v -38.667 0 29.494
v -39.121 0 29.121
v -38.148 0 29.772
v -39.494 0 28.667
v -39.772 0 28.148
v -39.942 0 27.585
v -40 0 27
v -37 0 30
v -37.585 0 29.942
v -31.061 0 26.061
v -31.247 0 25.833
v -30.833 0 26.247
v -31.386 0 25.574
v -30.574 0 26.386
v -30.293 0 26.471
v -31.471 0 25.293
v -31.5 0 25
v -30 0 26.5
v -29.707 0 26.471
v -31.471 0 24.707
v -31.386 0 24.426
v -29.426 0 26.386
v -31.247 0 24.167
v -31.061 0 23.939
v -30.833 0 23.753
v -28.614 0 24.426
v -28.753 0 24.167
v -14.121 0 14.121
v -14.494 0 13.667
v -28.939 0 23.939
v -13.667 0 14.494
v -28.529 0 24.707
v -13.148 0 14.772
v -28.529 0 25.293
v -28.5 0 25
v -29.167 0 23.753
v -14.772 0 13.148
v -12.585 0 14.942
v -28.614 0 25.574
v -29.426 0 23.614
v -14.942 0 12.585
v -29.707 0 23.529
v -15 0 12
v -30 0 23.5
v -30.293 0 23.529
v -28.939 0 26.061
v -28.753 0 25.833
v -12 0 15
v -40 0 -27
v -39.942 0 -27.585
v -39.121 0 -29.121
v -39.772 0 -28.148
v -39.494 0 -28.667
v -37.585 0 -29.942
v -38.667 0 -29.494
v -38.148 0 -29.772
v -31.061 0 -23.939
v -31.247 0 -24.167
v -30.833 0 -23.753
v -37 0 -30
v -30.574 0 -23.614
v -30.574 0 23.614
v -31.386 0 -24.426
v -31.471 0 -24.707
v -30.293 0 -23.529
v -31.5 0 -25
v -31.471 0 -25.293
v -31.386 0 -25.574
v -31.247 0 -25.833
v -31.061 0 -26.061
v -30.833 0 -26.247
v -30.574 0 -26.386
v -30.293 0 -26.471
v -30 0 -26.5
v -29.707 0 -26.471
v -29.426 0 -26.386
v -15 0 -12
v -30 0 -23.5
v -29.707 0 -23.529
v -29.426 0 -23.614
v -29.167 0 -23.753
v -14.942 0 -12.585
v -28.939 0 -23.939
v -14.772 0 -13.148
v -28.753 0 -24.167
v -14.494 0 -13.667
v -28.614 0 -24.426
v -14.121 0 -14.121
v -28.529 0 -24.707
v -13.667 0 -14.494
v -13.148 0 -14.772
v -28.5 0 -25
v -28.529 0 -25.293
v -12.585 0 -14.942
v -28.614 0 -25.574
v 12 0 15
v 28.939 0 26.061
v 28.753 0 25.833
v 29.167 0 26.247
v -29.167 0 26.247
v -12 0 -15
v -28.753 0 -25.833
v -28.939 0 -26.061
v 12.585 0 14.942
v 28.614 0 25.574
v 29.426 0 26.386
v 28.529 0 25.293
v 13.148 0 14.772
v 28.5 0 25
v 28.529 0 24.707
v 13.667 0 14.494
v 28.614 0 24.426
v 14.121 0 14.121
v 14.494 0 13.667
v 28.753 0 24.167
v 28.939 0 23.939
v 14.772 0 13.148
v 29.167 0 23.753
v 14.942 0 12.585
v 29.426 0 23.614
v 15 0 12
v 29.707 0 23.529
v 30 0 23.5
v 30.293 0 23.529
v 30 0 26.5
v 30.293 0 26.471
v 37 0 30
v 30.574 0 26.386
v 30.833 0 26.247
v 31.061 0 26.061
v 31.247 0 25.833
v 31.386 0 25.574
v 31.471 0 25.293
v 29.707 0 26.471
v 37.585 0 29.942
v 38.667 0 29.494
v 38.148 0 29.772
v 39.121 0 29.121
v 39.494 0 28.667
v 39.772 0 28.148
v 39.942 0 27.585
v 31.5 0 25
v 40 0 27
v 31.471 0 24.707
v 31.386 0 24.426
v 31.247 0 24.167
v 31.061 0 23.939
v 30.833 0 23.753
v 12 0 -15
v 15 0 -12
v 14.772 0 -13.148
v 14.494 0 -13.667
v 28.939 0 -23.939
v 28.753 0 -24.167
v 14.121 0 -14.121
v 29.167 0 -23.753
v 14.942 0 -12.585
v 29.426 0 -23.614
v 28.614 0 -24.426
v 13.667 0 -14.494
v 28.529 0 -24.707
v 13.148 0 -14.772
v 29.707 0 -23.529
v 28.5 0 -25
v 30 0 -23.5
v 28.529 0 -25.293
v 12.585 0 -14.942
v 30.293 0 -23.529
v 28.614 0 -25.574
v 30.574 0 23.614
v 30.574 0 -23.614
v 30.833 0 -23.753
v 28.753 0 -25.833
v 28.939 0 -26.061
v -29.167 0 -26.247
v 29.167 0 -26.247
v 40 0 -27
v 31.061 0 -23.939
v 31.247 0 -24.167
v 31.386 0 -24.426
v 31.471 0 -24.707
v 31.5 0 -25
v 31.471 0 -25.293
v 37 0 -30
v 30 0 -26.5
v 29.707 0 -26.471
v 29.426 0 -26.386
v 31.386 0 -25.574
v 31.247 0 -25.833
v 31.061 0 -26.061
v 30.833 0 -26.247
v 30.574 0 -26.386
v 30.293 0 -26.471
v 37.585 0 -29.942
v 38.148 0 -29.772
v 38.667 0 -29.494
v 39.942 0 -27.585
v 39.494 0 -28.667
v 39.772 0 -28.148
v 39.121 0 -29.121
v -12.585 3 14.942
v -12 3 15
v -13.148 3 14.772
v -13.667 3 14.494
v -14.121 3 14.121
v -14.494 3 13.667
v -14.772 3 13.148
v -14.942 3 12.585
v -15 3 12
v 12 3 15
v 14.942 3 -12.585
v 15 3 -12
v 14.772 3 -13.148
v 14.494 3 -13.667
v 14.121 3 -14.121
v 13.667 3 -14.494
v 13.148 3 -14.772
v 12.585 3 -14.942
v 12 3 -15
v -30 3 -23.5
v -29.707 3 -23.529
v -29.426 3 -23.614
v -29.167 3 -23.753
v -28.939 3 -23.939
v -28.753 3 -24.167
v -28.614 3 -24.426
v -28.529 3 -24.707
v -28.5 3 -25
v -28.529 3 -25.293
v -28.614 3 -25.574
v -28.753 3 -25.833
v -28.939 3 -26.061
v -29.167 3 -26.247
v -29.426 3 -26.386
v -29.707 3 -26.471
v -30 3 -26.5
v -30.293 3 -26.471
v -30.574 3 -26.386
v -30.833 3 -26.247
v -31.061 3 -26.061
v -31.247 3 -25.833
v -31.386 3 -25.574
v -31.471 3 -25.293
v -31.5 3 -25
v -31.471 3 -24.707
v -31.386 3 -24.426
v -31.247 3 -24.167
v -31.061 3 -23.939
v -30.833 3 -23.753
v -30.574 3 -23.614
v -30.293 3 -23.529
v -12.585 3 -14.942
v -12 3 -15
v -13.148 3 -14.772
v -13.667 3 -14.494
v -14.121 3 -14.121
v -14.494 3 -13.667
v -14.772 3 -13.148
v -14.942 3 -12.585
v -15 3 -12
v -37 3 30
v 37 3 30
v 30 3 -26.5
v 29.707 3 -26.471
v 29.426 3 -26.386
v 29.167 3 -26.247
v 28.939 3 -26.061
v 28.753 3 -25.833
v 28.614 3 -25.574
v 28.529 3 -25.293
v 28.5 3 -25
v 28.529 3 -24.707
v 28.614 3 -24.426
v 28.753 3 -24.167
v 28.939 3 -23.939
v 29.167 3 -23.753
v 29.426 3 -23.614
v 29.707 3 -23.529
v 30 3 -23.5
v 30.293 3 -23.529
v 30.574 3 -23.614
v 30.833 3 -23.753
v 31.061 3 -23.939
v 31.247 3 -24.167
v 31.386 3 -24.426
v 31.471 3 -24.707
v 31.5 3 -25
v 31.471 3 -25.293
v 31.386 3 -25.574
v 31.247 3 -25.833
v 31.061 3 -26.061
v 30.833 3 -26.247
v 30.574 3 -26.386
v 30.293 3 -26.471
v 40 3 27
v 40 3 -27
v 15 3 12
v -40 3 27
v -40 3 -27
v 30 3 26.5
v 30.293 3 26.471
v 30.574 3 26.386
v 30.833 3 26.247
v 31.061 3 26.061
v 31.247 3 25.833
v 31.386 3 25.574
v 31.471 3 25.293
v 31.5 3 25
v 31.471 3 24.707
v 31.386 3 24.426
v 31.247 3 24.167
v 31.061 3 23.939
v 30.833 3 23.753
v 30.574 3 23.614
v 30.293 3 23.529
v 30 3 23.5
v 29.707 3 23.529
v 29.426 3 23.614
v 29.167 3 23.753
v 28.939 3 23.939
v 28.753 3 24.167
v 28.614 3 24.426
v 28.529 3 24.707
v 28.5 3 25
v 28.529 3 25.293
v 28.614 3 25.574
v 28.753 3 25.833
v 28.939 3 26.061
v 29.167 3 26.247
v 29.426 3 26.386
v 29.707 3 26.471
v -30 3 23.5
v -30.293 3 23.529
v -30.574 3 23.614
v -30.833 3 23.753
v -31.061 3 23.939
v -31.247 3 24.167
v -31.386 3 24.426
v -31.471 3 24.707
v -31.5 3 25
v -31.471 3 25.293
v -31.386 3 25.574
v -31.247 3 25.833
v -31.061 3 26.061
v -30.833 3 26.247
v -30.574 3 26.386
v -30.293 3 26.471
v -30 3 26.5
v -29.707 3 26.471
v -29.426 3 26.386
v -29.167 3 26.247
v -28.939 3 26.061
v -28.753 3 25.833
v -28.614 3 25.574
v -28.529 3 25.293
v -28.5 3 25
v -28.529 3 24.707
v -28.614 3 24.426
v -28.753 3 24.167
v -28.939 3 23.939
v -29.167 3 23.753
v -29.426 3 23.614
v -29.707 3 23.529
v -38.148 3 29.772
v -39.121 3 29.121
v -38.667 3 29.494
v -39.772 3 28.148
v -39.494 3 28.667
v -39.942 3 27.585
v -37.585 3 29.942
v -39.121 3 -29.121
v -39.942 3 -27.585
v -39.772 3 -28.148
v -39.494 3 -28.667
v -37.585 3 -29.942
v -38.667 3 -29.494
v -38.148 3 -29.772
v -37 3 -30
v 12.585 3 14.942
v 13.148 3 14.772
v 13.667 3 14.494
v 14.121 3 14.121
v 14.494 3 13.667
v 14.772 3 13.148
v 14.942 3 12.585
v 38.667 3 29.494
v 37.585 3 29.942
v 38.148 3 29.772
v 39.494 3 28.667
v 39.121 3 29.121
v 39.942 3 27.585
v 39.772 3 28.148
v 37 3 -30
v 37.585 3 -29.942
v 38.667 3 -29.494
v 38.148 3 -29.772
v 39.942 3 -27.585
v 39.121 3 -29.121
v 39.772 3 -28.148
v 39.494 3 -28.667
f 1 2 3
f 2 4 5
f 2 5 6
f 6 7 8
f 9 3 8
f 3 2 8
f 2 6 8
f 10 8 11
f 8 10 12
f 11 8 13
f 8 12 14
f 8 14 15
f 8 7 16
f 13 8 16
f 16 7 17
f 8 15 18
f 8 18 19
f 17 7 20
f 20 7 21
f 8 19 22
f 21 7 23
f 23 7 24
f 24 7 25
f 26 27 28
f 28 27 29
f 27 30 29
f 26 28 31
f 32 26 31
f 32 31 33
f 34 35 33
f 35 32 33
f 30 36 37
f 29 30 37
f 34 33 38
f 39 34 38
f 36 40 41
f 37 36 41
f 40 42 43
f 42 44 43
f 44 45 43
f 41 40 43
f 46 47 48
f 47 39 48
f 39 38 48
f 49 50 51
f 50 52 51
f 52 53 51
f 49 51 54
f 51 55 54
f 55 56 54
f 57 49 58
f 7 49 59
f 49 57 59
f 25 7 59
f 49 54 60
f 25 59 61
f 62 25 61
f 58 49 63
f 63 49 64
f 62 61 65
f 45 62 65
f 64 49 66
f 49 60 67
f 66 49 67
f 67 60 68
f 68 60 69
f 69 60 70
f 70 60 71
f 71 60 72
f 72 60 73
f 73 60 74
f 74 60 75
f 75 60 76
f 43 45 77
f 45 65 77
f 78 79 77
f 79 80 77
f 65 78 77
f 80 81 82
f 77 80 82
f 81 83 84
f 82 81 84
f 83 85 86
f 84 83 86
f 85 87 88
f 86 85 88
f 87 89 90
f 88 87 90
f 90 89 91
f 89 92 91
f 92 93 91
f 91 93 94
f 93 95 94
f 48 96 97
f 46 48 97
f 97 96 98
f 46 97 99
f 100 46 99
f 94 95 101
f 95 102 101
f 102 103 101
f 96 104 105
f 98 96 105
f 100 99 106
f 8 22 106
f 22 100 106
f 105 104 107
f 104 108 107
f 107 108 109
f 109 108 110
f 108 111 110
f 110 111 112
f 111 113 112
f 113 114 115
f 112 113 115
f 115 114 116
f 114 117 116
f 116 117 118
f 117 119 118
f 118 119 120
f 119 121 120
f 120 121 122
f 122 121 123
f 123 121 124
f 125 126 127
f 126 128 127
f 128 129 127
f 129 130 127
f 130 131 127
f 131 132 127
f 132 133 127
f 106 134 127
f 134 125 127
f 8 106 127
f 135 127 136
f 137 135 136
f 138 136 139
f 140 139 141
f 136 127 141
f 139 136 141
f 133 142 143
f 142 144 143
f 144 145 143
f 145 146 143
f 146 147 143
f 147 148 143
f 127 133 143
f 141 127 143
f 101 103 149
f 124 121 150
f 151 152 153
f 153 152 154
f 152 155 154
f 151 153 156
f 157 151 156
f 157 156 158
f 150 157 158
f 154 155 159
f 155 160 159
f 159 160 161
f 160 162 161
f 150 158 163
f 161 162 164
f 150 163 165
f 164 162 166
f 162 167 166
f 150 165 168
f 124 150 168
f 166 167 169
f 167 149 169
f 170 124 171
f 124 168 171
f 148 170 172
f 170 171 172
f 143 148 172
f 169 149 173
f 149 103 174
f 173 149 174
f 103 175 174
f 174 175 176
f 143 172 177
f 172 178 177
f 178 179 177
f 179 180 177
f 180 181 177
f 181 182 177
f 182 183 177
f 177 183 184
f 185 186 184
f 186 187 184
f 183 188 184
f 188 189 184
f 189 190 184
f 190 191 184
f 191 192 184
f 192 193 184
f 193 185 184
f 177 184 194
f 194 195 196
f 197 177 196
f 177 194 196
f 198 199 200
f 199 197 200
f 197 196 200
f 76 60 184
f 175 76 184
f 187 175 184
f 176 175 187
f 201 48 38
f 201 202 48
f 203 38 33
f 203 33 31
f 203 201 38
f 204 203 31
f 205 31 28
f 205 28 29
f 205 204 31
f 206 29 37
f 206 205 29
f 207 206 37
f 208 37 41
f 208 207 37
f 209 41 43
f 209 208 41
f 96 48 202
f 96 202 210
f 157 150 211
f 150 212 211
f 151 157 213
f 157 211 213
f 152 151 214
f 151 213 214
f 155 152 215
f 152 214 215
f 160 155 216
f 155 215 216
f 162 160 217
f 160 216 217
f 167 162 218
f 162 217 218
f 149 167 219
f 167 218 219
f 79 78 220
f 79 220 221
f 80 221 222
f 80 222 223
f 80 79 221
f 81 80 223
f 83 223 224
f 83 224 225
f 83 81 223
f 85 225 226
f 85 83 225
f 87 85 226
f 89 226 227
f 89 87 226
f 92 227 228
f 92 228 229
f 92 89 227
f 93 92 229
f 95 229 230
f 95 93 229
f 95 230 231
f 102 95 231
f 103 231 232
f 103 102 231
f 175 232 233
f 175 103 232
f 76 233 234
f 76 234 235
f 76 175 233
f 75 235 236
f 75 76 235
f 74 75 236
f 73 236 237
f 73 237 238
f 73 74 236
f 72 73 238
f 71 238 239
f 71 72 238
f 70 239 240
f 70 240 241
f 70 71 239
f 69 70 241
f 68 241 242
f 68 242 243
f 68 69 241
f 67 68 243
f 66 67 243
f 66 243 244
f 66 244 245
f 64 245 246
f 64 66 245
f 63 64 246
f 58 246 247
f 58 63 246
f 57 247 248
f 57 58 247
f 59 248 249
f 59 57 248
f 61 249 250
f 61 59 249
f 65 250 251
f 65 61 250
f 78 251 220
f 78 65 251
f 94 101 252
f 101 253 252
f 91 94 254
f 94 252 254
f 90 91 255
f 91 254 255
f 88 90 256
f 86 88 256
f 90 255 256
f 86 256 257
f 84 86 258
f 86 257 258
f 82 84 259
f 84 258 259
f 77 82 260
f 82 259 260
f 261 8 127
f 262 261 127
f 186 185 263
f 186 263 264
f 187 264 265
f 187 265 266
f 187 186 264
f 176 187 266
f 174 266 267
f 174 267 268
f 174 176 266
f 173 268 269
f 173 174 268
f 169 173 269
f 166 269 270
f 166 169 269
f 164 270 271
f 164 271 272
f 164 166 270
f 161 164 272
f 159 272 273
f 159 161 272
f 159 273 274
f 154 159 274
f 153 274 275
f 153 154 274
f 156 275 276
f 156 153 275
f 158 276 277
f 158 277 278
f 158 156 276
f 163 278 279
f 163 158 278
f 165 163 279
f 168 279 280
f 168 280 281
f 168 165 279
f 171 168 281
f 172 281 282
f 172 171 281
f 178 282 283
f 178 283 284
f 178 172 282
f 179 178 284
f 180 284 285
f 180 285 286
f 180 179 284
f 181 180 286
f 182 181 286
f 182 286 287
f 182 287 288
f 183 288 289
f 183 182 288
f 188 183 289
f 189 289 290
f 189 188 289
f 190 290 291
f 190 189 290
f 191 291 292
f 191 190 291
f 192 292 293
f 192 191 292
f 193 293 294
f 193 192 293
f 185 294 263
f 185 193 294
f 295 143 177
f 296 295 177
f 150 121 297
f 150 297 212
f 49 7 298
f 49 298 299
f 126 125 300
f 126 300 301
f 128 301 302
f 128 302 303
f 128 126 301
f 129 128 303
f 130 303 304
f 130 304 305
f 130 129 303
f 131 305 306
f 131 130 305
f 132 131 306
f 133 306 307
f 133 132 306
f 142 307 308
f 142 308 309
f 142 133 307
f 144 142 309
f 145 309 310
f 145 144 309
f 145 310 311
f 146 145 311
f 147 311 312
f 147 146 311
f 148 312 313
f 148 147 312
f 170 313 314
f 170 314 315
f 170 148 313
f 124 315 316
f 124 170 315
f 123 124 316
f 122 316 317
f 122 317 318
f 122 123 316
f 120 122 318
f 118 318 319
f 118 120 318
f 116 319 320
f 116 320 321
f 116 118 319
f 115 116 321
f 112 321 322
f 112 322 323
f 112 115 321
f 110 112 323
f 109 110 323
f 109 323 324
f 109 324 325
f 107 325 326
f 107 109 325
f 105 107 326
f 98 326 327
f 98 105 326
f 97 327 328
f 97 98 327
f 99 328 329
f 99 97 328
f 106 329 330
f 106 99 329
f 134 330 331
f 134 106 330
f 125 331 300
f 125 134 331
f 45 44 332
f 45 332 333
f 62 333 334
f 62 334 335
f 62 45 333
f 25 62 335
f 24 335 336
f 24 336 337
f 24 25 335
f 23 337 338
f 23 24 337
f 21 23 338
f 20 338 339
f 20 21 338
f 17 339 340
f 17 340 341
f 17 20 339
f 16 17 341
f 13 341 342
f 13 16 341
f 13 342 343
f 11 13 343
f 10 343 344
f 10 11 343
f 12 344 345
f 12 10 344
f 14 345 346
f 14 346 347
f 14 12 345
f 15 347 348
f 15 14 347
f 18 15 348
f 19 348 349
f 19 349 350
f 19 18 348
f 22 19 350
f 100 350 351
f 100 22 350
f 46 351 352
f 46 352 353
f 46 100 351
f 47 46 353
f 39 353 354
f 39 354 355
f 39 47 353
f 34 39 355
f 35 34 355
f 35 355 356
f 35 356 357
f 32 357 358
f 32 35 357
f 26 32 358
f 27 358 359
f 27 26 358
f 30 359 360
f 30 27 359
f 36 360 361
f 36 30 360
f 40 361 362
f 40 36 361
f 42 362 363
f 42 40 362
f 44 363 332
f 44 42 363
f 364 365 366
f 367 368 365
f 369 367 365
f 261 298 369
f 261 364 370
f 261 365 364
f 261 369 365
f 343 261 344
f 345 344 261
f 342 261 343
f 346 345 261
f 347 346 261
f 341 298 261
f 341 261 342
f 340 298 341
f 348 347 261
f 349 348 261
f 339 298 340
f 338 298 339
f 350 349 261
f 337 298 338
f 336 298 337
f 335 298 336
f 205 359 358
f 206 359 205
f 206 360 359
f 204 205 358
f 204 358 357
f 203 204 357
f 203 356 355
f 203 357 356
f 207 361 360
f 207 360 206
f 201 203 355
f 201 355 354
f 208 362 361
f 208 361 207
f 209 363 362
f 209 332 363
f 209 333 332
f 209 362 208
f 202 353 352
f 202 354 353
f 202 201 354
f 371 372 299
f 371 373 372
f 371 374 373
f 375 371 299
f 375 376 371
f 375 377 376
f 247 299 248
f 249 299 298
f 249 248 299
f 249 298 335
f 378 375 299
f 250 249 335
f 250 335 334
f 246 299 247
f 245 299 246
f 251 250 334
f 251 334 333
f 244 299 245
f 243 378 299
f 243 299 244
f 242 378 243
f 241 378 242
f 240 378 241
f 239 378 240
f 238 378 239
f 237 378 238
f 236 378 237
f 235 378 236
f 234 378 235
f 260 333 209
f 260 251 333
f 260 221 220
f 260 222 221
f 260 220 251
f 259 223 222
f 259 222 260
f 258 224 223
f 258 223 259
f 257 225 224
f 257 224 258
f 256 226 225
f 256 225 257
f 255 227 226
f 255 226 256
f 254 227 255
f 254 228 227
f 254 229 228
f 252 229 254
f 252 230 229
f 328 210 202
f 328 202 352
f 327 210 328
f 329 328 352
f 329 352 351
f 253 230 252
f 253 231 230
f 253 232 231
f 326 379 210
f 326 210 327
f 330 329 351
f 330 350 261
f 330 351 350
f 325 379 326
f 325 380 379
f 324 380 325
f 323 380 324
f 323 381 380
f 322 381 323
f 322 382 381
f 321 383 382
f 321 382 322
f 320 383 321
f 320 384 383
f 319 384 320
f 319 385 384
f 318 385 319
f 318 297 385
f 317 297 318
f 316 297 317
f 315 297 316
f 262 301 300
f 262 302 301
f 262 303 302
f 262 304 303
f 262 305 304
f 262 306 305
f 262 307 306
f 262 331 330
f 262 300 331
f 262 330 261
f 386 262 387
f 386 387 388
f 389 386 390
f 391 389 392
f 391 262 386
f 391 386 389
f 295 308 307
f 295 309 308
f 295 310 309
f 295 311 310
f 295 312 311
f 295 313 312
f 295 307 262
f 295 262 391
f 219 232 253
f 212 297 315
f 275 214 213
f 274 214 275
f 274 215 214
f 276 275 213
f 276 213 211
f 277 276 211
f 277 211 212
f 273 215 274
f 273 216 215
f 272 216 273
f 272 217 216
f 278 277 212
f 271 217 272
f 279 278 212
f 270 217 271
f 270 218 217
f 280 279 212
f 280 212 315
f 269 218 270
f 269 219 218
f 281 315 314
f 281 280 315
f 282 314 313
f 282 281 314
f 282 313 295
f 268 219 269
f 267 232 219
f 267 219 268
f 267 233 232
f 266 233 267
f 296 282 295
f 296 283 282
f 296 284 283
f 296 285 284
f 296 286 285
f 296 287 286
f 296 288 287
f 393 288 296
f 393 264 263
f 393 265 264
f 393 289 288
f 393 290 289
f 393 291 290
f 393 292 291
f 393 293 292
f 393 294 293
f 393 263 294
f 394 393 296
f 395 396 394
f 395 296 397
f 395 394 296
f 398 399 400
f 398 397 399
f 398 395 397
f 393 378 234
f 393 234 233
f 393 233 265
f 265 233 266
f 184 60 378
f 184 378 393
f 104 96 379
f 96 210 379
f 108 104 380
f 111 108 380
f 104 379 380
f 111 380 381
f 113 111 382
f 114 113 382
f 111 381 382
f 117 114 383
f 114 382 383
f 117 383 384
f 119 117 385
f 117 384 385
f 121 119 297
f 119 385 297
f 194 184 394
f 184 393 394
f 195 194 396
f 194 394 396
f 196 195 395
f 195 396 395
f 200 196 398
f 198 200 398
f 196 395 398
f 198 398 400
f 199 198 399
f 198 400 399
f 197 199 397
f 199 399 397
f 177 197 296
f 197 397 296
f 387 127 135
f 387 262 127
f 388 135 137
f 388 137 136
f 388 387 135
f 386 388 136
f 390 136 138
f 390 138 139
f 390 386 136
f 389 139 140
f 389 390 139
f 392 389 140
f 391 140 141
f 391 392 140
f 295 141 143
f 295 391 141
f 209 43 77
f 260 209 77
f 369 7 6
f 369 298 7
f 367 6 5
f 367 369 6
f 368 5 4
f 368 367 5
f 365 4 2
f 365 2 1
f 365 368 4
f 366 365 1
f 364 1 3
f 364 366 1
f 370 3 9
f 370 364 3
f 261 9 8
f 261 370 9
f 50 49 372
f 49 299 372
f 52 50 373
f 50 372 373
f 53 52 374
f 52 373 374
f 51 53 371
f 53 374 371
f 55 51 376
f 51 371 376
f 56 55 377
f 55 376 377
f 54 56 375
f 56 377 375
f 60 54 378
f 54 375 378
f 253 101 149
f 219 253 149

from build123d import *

# Parameters (mm, degrees)
SKETCH_1_W      = 80
SKETCH_1_H      = 60
SKETCH_1_R      = 1.5
SKETCH_1_W_2    = 30
SKETCH_1_H_2    = 30
EXTRUDE_1_DEPTH = 3
FILLET_1_R      = 3
FILLET_2_R      = 3


with BuildPart() as part:
    # 草图1 → 凸台-拉伸1 (new body)
    with BuildSketch(Plane(origin=(0, 0, 0), x_dir=(1, 0, 0), z_dir=(0, 1, 0))):
        Rectangle(SKETCH_1_W, SKETCH_1_H)
        with Locations(Location((-30, 25, 0), (0, 0, 270))):
            Circle(SKETCH_1_R, mode=Mode.SUBTRACT)
        with Locations(Location((30, 25, 0), (0, 0, 90))):
            Circle(SKETCH_1_R, mode=Mode.SUBTRACT)
        with Locations(Location((30, -25, 0), (0, 0, 270))):
            Circle(SKETCH_1_R, mode=Mode.SUBTRACT)
        with Locations(Location((-30, -25, 0), (0, 0, 90))):
            Circle(SKETCH_1_R, mode=Mode.SUBTRACT)
        Rectangle(SKETCH_1_W_2, SKETCH_1_H_2, mode=Mode.SUBTRACT)
    extrude(amount=EXTRUDE_1_DEPTH)

    # 圆角1
    fillet_1_edges = [part.edges().sort_by_distance(p)[0] for p in [
        (40, 1.5, 30),
        (-40, 1.5, 30),
        (-40, 1.5, -30),
        (40, 1.5, -30),
    ]]
    fillet(fillet_1_edges, radius=FILLET_1_R)

    # 圆角2
    fillet_2_edges = [part.edges().sort_by_distance(p)[0] for p in [
        (15, 1.5, 15),
        (15, 1.5, -15),
        (-15, 1.5, -15),
        (-15, 1.5, 15),
    ]]
    fillet(fillet_2_edges, radius=FILLET_2_R)


solid = part.part
